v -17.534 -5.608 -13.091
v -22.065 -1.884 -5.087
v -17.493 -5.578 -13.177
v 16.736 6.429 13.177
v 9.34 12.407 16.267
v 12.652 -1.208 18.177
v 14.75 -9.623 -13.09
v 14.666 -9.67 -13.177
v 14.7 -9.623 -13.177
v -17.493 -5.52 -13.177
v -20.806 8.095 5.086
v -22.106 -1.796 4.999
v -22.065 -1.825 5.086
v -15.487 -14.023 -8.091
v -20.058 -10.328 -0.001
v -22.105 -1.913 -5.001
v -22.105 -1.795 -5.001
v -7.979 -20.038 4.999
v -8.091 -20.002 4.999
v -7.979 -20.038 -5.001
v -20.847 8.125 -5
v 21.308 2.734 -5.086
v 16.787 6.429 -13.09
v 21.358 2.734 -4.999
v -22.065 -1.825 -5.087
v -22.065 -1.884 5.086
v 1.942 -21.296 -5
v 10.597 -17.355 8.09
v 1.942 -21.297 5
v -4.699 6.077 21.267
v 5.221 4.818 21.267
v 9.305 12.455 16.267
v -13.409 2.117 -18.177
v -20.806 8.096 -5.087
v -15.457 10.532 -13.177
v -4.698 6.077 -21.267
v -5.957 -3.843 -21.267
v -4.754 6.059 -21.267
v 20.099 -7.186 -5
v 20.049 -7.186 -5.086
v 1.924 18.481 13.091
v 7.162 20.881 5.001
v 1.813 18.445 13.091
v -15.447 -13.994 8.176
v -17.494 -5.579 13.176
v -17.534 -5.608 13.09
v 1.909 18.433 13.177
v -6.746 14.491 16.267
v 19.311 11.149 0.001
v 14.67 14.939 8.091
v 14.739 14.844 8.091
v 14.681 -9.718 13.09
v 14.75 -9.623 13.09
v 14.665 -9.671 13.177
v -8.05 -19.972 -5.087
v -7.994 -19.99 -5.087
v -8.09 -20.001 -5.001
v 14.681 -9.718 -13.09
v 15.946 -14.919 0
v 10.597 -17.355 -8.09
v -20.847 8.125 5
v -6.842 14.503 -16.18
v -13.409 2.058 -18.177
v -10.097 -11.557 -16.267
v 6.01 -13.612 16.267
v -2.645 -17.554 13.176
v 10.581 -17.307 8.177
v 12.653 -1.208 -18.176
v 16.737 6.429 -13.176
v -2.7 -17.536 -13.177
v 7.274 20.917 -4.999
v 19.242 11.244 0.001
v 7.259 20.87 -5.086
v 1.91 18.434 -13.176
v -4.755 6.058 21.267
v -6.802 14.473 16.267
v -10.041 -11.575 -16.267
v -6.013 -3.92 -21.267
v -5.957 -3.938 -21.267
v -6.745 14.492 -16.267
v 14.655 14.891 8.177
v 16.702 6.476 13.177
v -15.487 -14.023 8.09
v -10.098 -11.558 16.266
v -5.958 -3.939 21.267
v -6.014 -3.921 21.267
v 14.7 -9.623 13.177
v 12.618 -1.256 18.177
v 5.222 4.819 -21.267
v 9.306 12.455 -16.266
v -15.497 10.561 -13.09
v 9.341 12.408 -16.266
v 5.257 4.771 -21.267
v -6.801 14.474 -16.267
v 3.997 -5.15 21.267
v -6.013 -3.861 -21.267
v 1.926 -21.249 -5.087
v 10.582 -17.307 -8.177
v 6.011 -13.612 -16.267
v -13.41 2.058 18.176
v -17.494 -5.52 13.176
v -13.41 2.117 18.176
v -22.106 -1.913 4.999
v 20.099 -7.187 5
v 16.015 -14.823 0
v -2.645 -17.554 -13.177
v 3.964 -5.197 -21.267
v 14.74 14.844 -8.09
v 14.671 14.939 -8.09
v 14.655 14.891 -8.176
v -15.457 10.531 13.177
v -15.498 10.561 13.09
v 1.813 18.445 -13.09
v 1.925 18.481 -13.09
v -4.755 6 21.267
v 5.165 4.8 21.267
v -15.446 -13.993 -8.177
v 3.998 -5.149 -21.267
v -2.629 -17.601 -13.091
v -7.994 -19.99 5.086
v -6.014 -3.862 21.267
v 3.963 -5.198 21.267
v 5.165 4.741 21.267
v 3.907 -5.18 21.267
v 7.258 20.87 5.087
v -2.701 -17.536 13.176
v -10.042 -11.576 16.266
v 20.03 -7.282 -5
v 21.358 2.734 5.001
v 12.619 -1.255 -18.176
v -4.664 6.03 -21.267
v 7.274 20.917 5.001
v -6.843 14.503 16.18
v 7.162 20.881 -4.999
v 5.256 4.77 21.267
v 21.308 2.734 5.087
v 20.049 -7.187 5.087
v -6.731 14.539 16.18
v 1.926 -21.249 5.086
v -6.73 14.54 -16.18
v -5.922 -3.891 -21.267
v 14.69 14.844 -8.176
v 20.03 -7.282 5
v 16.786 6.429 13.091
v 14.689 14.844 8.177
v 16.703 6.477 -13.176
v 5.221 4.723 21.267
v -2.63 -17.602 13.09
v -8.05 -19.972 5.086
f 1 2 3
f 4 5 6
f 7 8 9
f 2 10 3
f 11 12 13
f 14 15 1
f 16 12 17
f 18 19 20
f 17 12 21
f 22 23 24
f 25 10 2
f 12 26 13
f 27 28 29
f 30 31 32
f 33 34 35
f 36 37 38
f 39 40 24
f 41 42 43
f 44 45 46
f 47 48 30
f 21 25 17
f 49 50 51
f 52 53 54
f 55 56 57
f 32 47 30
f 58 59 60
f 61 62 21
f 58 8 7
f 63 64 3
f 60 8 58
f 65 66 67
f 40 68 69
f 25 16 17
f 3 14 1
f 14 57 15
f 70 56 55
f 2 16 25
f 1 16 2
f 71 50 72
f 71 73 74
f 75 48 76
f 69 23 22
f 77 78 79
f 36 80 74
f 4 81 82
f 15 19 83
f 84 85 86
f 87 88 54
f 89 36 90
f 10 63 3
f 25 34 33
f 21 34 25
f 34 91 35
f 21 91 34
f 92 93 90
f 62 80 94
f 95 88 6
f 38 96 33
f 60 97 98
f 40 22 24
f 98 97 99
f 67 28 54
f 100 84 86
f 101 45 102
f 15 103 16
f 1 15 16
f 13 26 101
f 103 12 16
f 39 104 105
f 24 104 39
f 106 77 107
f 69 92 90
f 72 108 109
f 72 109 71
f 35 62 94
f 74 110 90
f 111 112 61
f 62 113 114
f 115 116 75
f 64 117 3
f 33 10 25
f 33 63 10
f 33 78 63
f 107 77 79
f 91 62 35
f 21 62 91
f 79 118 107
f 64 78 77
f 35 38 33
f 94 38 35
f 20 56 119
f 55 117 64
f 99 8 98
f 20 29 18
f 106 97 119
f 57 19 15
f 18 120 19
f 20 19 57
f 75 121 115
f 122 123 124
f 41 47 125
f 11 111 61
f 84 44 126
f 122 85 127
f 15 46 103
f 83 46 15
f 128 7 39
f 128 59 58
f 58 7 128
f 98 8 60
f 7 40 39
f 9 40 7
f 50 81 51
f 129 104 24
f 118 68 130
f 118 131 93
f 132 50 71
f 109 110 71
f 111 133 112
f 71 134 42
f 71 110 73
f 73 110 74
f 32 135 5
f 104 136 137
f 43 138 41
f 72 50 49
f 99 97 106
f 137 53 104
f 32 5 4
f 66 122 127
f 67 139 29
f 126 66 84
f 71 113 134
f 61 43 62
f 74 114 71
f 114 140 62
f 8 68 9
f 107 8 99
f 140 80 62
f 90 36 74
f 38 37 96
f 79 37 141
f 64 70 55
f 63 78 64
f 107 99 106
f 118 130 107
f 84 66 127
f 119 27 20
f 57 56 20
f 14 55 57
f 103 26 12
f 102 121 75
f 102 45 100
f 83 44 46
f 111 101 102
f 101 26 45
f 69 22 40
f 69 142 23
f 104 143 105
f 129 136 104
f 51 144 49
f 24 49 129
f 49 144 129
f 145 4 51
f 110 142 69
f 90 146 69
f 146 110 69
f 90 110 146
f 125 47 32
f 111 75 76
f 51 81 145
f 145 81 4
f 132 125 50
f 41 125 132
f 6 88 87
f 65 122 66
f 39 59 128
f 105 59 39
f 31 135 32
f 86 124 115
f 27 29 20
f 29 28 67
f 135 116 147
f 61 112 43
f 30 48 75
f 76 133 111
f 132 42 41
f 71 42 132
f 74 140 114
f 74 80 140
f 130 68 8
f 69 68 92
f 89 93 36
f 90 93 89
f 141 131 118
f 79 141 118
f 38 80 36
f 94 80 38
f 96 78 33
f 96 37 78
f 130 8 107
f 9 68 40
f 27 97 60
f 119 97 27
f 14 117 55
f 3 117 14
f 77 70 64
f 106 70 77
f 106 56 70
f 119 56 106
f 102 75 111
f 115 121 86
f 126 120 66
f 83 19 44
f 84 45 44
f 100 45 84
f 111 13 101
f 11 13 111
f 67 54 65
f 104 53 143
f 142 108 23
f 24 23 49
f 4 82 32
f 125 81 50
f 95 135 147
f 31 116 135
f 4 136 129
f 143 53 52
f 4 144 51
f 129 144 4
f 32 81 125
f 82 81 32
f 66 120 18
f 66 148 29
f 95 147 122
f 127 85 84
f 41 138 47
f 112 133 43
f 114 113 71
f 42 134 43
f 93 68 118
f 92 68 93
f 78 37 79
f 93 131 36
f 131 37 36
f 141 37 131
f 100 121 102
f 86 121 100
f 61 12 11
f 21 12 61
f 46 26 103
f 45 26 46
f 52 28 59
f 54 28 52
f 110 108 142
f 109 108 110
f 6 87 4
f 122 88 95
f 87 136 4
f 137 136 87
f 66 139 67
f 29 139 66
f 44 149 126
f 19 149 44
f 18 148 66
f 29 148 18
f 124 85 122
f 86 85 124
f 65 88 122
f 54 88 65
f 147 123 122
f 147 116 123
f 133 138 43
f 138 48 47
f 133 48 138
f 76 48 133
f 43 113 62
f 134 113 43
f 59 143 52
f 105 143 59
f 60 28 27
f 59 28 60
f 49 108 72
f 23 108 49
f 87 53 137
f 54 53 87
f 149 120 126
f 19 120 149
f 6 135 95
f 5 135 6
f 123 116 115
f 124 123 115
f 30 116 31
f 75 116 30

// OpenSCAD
// Auto-generated OpenSCAD file

    inner_points = 10*[[-0.6761707289295088, 1.4443912429777448, 1.6180428150467039], [1.2603258031723903, -0.12076505073214727, -1.8089878045154844], [-0.4714605992542724, 0.6029023975518815, 2.1180331007845328], [1.465035932847627, -0.9622538961580105, -1.3089975187776557], [-1.541683511369511, 1.050210284169558, 1.3089975187776557], [0.3948130207323881, -0.514946009540334, -2.1180331007845328], [-1.3369733816942744, 0.20872143874369475, 1.8089878045154844], [0.5995231504076245, -1.3564348549661973, -1.6180428150467039], [1.463934226922532, 1.4843529255560477, 0.8090793922871596], [1.921079046691184, 1.1148696448288868, 6.720509726276802e-05], [1.6686443565977682, 0.6428640801301844, 1.3090696780249882], [2.12578917636642, 0.2733807994030234, 0.5000574908350913], [-2.202436754888304, -0.18542441139147592, -0.5000574908350913], [-1.7452919351196523, -0.5549076921186369, -1.3090696780249882], [-1.997726625213068, -1.0269132568173394, -6.720509726276802e-05], [-1.540581805444416, -1.3963965375445002, -0.8090793922871596], [0.18942199934983583, 1.838629008812172, -1.308979864697917], [0.5994432045682823, -1.3564916619924376, 1.6180251609669651], [1.0565880243369343, -1.7259749427195985, 0.8090129737770685], [-0.6760907830901666, 1.4444480500039851, -1.6180251609669651], [-0.26606957787172014, -1.7506726208006245, 1.308979864697917], [0.1910752418969318, -2.1201559015277853, 0.49996767750802007], [0.5206899199254378, 0.4770998592723383, -2.118012576336173], [-0.5973374984473221, -0.3891434712607908, 2.118012576336173], [1.0566279972566053, -1.7259465392064783, -0.8090210142297662], [0.9289932050541309, 1.2407181409580579, 1.6180788946703704], [2.1258138809894067, 0.2733983537395316, -0.49994250870567225], [-2.202461459511291, -0.1854419657279841, 0.49994250870567225], [-1.005640783576015, -1.1527617529465104, -1.6180788946703704], [0.7243230482985655, 2.082235389897041, -0.4999453790742929], [1.4649712553049694, -0.9622998540076386, 1.3090364687699425], [-1.5416188338268535, 1.050256242019186, -1.3090364687699425], [-0.8009706268204498, -1.9942790018854937, 0.4999453790742929], [0.18935732180717835, 1.8385830509625434, 1.3090541228496813], [1.6687090341404256, 0.6429100379798126, -1.3089643095226098], [0.5205852694631093, 0.47702549790959015, 2.1180553992182594], [1.9999369817963566, -0.7186475150731406, -0.4999630331540315], [-2.0765845603182407, 0.8066039030846881, 0.4999630331540315], [-0.5972328479849937, -0.38906910989804266, -2.1180553992182594], [-1.7453566126623097, -0.5549536499682651, 1.3089643095226098], [-0.26600490032906265, -1.750626662950996, -1.3090541228496813], [0.7242983436755794, 2.082217835560533, 0.5000546204664706], [1.463974199842203, 1.4843813290691679, -0.8089545957196747], [1.260236421006747, -0.12082856291828337, 1.8090461825728774], [1.9999122771733702, -0.7186650694096489, 0.5000369663867321], [-2.0765598556952543, 0.8066214574211964, -0.5000369663867321], [-1.336883999528631, 0.20878495092983085, -1.8090461825728774], [-1.540621778364087, -1.3964249410576204, 0.8089545957196747], [-0.8009459221974637, -1.9942614475489857, -0.5000546204664706], [0.9290731508934732, 1.2407749479842982, -1.6179890813432987], [0.39470837027005956, -0.5150203709030822, 2.1180348747699], [1.591529046205335, -1.4823401581216085, 1.3471393857822367e-05], [-0.47135594879194387, 0.6029767589146297, -2.1180348747699], [-1.0057207294153574, -1.1528185599727507, 1.6179890813432987], [0.19109994651991802, -2.120138347191277, -0.5000323220327436]];

    outer_points = 10*[[0.02552547509395009, 2.1187272483769695, -0.7045645993136277], [-1.3615932646610294, -1.6727578892770014, 0.5779384076102413], [0.6827172728374509, 1.6727578892770014, -1.3121913529400864], [-0.7044014669175285, -2.1187272483769695, -0.029688346016217504], [0.7044014669175285, 2.1187272483769695, 0.029688346016217504], [-0.6827172728374509, -1.6727578892770014, 1.3121913529400864], [1.3615932646610294, 1.6727578892770014, -0.5779384076102413], [-0.02552547509395009, -2.1187272483769695, 0.7045645993136277], [-1.6027511659773777, 0.6705087936332265, -1.4027382632260594], [-1.9302054814233927, -0.22453943453325823, -1.099980372244143], [-0.945559368233877, 0.22453943453325823, -2.0103650168525182], [-1.273013683679892, -0.6705087936332265, -1.7076071258706018], [1.273013683679892, 0.6705087936332265, 1.7076071258706018], [0.945559368233877, -0.22453943453325823, 2.0103650168525182], [1.9302054814233927, 0.22453943453325823, 1.099980372244143], [1.6027511659773777, -0.6705087936332265, 1.4027382632260594], [-1.8951197183831776, 0.4970541464314976, 1.0712265894806337], [1.2162437265595991, -0.4970541464314976, -1.8054795348104788], [0.8887894111135841, -1.3921023745979824, -1.5027216438285624], [-1.2162437265595991, 0.4970541464314976, 1.8054795348104788], [1.8951197183831776, -0.4970541464314976, -1.0712265894806337], [1.5676654029371626, -1.3921023745979824, -0.7684686984987172], [-1.4526456533333216, -1.0353759855059943, 1.3430879167013183], [1.4526456533333216, 1.0353759855059943, -1.3430879167013183], [0.26790481028680946, -2.2029389255707184, -0.24769957676650906], [-0.7994549424817525, 1.1716333414551139, -1.7245912807479955], [-1.6567414700822498, -1.1716333414551139, -0.9319608317951029], [1.6567414700822498, 1.1716333414551139, 0.9319608317951029], [0.7994549424817525, -1.1716333414551139, 1.7245912807479955], [-2.077531341052028, 0.8067661495823462, 0.13805753994051662], [0.3002109203116041, -0.8067661495823462, -2.06035670715377], [-0.3002109203116041, 0.8067661495823462, 2.06035670715377], [2.077531341052028, -0.8067661495823462, -0.13805753994051662], [-0.8905073311540451, 1.809015245226121, -0.9594417716569185], [-1.9501717554630091, -1.0874216642613652, 0.020303344285033886], [0.1728513347225853, 1.0874216642613652, -1.9426025114982872], [-0.8868130895863787, -1.809015245226121, -0.9628573955563348], [0.8868130895863787, 1.809015245226121, 0.9628573955563348], [-0.1728513347225853, -1.0874216642613652, 1.9426025114982872], [1.9501717554630091, 1.0874216642613652, -0.020303344285033886], [0.8905073311540451, -1.809015245226121, 0.9594417716569185], [-1.6938035546496701, 1.3078906974042335, -0.6375887541349824], [-2.2236357668041524, -0.14032775733950953, -0.1477161961640061], [0.02674690897046106, 0.14032775733950953, -2.22837624760281], [-0.503085303184021, -1.3078906974042335, -1.7385036896318335], [0.503085303184021, 1.3078906974042335, 1.7385036896318335], [-0.02674690897046106, -0.14032775733950953, 2.22837624760281], [2.2236357668041524, 0.14032775733950953, 0.1477161961640061], [1.6938035546496701, -1.3078906974042335, 0.6375887541349824], [-2.041224144135302, -0.4500397604903581, 0.7854528533761111], [0.9427797152184564, 0.4500397604903581, -1.9734990752595192], [0.0854931876179591, -1.8932269224198697, -1.1808686263066264], [-0.9427797152184564, -0.4500397604903581, 1.9734990752595192], [2.041224144135302, 0.4500397604903581, -0.7854528533761111], [1.1839376165348048, -1.8932269224198697, 0.00717759557678177]];

    // Convex hull for inner set (I)
    module inner_hull() {
        hull() {
            for (p = inner_points) {
                translate(p) sphere(r=0.1);
            }
        }
    }

    // Convex hull for outer set (O) minus inner hull (O \ I)
    module outer_minus_inner() {
        difference() {
            hull() {
                for (p = outer_points) {
                    translate(p) sphere(r=0.1);
                }
            }
            inner_hull(); // Subtract inner hull
        }
    }

    // Convex hull for outer set (O) minus all translated inner hulls
    module outer_minus_AllTranslationInner() {
        difference() {
            hull() {
                for (p = outer_points) {
                    translate(p) sphere(r=0.1);
                }
            }
            hull() {
                translate([0,0,50]) inner_hull();
                translate([0,0,-50]) inner_hull();
            }; // Subtract translated inner hulls
        }
    }

    // Difference between outer_minus_inner and outer_minus_AllTranslationInner
    module outer_minus_inner_diff() {
        difference() {
            // Outer minus inner
            difference() {
                hull() {
                    for (p = outer_points) {
                        translate(p) sphere(r=0.1);
                    }
                }
                inner_hull();
            }

            // Subtract Outer minus AllTranslationInner
            difference() {
                hull() {
                    for (p = outer_points) {
                        translate(p) sphere(r=0.1);
                    }
                }
                hull() {
                    translate([0,0,50]) inner_hull();
                    translate([0,0,-50]) inner_hull();
                };
            }
        }
    }

    // Rendering all with colors applied
    color([1, 0, 0, 0.5]) inner_hull(); // Transparent red
    
